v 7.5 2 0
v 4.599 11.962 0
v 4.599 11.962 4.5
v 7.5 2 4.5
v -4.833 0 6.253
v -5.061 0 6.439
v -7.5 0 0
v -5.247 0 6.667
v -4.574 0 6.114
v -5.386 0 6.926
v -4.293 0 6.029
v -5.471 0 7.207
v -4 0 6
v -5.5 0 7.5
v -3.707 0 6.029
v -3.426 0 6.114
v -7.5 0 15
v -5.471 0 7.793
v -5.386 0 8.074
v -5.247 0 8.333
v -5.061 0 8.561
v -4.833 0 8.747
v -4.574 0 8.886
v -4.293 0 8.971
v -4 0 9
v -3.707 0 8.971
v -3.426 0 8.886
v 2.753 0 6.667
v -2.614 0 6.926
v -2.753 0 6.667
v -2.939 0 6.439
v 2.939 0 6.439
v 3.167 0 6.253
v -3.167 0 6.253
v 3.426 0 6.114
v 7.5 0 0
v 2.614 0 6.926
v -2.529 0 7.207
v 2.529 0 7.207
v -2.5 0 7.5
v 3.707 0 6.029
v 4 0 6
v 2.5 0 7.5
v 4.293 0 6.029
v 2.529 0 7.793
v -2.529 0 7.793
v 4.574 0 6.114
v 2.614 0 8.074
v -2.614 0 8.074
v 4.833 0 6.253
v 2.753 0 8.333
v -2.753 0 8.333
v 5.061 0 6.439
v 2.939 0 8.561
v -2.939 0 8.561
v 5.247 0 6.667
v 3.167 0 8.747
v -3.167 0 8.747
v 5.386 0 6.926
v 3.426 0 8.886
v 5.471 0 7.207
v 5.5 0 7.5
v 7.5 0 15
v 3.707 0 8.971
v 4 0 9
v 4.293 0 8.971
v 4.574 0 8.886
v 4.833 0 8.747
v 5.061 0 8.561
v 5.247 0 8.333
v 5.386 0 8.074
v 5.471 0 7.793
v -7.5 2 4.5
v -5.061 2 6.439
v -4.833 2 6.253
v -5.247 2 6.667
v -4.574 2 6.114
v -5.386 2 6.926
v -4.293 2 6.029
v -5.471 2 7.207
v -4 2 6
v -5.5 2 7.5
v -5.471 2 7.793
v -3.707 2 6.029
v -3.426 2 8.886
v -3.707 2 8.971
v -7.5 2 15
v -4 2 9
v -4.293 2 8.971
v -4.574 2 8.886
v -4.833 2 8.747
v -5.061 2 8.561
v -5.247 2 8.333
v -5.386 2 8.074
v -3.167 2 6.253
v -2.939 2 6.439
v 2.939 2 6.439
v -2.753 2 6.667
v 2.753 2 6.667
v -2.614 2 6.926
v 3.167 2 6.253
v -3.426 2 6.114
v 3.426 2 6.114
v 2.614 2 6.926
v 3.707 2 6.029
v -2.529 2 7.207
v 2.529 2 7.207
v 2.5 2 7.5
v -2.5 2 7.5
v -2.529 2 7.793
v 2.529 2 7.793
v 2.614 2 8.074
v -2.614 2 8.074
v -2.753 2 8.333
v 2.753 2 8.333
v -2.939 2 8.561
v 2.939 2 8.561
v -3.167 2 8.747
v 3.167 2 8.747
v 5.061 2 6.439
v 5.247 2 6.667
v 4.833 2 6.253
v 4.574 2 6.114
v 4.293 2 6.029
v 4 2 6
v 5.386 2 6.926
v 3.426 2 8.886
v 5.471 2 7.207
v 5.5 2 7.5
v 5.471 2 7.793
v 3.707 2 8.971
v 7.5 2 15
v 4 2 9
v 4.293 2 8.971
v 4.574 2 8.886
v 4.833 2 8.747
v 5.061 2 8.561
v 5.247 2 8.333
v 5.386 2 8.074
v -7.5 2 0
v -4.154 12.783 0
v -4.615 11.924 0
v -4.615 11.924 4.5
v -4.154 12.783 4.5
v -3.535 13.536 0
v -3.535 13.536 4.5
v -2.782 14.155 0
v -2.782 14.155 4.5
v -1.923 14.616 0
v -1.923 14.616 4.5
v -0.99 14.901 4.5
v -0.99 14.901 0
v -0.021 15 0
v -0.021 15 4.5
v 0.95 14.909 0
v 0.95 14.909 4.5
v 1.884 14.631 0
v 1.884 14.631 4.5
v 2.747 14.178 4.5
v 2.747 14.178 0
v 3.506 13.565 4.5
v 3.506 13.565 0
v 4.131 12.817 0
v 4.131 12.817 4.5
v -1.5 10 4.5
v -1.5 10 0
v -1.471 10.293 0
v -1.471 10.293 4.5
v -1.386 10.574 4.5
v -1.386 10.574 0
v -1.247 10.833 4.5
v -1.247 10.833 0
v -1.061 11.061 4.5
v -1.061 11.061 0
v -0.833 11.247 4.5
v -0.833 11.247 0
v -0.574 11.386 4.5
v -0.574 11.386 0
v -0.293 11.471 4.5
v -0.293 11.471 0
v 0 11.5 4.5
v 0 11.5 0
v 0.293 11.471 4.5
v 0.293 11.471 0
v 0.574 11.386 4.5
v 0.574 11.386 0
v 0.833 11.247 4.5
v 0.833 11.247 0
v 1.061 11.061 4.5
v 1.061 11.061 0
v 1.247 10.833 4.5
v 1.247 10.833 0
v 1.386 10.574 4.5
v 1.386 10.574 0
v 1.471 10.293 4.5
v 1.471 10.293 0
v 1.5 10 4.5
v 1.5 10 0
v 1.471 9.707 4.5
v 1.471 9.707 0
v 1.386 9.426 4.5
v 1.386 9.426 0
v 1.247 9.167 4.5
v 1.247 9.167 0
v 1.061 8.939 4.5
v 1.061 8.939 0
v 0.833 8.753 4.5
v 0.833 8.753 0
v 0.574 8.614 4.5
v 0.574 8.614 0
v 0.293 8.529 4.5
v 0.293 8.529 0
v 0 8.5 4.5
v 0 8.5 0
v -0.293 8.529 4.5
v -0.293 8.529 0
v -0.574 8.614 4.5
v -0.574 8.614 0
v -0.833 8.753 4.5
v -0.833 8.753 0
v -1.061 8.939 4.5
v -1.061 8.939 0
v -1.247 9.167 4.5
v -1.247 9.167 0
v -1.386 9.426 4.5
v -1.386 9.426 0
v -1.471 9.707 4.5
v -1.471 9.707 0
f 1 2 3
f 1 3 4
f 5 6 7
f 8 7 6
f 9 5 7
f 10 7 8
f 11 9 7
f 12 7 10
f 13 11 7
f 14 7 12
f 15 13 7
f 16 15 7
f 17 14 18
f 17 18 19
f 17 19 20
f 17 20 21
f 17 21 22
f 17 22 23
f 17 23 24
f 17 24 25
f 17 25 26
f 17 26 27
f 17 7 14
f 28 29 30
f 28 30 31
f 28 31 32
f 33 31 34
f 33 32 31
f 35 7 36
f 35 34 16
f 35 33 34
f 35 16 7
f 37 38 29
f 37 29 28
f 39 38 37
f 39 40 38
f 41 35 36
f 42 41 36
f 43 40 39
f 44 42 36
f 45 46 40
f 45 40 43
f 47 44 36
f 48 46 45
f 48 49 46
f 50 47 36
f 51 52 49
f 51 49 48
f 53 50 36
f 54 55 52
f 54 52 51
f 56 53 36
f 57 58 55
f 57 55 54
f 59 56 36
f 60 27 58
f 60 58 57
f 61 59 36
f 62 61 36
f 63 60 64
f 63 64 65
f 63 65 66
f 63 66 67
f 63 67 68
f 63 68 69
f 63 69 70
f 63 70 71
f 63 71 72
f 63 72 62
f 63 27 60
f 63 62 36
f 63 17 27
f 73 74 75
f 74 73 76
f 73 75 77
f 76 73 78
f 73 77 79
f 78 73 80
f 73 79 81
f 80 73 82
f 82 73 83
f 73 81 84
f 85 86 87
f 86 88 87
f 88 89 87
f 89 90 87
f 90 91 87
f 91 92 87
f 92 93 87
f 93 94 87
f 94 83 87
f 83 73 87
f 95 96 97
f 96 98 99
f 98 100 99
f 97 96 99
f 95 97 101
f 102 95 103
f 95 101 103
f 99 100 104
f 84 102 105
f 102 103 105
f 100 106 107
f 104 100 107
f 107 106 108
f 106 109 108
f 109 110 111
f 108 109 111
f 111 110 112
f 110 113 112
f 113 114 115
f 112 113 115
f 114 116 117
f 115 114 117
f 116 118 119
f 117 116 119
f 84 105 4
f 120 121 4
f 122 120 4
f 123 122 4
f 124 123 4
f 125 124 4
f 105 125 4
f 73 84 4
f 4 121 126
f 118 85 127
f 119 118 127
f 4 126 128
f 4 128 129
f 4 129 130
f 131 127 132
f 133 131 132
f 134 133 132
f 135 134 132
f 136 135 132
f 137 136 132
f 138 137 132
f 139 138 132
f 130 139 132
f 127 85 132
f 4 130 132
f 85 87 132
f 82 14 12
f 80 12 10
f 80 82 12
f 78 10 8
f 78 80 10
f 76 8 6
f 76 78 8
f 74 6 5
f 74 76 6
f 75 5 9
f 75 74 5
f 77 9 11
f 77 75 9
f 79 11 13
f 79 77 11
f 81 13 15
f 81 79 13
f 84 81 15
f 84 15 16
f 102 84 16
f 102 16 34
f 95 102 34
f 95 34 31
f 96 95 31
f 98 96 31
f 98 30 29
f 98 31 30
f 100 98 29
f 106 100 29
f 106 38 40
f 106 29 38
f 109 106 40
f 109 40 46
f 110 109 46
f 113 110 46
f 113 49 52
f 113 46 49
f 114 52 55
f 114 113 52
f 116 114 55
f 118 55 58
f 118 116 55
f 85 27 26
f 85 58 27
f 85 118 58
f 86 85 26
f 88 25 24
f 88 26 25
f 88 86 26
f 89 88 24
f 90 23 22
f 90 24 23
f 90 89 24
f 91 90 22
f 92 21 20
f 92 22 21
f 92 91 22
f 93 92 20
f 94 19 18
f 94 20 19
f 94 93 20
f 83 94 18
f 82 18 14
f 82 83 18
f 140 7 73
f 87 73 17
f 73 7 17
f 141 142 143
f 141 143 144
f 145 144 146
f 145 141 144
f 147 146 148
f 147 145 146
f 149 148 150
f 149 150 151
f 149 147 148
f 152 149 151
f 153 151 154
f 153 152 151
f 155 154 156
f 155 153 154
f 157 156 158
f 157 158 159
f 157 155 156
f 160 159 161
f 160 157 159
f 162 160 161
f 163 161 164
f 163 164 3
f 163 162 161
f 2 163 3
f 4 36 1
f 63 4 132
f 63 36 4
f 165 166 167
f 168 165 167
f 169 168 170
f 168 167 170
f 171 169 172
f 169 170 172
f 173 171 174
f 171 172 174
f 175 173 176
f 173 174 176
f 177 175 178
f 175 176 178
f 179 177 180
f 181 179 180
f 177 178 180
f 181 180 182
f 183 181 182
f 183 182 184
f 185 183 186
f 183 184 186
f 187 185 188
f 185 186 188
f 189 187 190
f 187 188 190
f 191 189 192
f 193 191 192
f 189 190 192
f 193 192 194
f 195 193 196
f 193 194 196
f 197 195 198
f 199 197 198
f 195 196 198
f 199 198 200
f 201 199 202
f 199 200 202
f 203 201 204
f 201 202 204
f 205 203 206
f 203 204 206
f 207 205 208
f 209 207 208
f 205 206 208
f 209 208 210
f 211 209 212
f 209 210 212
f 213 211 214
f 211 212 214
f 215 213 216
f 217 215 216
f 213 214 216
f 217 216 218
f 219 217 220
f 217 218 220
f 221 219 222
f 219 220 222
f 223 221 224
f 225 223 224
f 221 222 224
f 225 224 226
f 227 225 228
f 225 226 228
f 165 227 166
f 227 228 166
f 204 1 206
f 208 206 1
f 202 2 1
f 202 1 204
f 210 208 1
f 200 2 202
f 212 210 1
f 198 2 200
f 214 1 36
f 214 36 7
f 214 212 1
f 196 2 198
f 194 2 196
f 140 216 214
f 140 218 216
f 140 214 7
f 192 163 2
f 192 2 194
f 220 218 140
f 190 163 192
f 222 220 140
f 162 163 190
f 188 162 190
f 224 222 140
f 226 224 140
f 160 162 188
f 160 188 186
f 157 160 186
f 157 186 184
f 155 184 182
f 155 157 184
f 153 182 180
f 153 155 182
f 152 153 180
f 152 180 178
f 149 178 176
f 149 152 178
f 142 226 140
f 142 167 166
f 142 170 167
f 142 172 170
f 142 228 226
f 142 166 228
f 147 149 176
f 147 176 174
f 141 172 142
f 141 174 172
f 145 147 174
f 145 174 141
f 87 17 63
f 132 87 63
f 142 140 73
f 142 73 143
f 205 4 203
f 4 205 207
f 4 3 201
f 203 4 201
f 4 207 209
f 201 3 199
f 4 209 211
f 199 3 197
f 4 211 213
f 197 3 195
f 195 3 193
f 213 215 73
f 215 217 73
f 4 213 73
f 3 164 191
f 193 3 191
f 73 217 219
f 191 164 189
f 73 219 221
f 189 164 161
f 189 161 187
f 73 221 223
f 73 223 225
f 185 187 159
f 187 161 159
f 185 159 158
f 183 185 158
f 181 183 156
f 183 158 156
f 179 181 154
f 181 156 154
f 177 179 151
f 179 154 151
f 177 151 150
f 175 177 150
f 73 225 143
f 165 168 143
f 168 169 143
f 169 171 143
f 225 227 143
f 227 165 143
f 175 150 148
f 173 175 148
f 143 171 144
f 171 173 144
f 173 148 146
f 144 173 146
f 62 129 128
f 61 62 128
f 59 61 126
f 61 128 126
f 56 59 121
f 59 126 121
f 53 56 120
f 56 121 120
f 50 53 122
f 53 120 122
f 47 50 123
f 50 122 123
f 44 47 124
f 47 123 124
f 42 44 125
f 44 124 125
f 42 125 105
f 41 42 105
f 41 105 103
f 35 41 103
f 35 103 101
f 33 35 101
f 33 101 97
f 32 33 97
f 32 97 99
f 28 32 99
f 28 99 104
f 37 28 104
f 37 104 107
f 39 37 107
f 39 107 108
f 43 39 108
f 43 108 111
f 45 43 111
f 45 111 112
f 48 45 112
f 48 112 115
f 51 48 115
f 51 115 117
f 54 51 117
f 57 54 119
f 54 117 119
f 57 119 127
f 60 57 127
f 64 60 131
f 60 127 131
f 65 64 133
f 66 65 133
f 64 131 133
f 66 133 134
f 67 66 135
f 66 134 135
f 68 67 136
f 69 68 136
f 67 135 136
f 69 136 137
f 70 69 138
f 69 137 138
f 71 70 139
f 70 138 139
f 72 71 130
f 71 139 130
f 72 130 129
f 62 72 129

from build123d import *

# Parameters (mm, degrees)
SKETCH7_W           = 15
SKETCH7_H           = 7.5
BOSS_EXTRUDE2_DEPTH = 2
SKETCH8_R           = 1.5
BOSS_EXTRUDE3_DEPTH = 4.5
SKETCH9_R           = 1.5
CUT_EXTRUDE1_DEPTH  = 3


with BuildPart() as part:
    # Sketch7 → Boss-Extrude2 (new body)
    with BuildSketch(Plane(origin=(0, 0, 0), x_dir=(1, 0, 0), z_dir=(0, 1, 0))):
        with Locations((0, -3.75)):
            Rectangle(SKETCH7_W, SKETCH7_H)
    boss_extrude2 = extrude(amount=BOSS_EXTRUDE2_DEPTH)

    # Sketch8 → Boss-Extrude3 (add)
    with BuildSketch(Plane(origin=(0, 0, 0), x_dir=(-1, 0, 0), z_dir=(0, 0, -1))):
        with BuildLine():
            Line((-4.598991345, 11.961957852), (-7.5, 2))
            Line((-7.5, 2), (7.5, 2))
            Line((7.5, 2), (4.615024569, 11.923940807))
            ThreePointArc((4.615024569, 11.923940807), (0.020629833, 14.999957441), (-4.598991345, 11.961957852))
        make_face()
        with Locations((0, 10)):
            Circle(SKETCH8_R, mode=Mode.SUBTRACT)
    extrude(amount=-BOSS_EXTRUDE3_DEPTH)

    # Mirror1: Boss-Extrude2 across plane
    add(boss_extrude2.mirror(Plane(origin=(7.5, 2, 7.5), x_dir=(1, 0, 0), z_dir=(0, 0, -1))))

    # Sketch9 → Cut-Extrude1 (cut, through all)
    with BuildSketch(Plane(origin=(0, 2, 0), x_dir=(1, 0, 0), z_dir=(0, 1, 0))):
        with Locations((4, -7.5)):
            Circle(SKETCH9_R)
    cut_extrude1 = extrude(amount=-CUT_EXTRUDE1_DEPTH, mode=Mode.SUBTRACT)

    # Mirror2: Cut-Extrude1 across plane
    add(cut_extrude1.mirror(Plane(origin=(0, 0, 0), x_dir=(0, 0, 1), z_dir=(1, 0, 0))), mode=Mode.SUBTRACT)


solid = part.part
